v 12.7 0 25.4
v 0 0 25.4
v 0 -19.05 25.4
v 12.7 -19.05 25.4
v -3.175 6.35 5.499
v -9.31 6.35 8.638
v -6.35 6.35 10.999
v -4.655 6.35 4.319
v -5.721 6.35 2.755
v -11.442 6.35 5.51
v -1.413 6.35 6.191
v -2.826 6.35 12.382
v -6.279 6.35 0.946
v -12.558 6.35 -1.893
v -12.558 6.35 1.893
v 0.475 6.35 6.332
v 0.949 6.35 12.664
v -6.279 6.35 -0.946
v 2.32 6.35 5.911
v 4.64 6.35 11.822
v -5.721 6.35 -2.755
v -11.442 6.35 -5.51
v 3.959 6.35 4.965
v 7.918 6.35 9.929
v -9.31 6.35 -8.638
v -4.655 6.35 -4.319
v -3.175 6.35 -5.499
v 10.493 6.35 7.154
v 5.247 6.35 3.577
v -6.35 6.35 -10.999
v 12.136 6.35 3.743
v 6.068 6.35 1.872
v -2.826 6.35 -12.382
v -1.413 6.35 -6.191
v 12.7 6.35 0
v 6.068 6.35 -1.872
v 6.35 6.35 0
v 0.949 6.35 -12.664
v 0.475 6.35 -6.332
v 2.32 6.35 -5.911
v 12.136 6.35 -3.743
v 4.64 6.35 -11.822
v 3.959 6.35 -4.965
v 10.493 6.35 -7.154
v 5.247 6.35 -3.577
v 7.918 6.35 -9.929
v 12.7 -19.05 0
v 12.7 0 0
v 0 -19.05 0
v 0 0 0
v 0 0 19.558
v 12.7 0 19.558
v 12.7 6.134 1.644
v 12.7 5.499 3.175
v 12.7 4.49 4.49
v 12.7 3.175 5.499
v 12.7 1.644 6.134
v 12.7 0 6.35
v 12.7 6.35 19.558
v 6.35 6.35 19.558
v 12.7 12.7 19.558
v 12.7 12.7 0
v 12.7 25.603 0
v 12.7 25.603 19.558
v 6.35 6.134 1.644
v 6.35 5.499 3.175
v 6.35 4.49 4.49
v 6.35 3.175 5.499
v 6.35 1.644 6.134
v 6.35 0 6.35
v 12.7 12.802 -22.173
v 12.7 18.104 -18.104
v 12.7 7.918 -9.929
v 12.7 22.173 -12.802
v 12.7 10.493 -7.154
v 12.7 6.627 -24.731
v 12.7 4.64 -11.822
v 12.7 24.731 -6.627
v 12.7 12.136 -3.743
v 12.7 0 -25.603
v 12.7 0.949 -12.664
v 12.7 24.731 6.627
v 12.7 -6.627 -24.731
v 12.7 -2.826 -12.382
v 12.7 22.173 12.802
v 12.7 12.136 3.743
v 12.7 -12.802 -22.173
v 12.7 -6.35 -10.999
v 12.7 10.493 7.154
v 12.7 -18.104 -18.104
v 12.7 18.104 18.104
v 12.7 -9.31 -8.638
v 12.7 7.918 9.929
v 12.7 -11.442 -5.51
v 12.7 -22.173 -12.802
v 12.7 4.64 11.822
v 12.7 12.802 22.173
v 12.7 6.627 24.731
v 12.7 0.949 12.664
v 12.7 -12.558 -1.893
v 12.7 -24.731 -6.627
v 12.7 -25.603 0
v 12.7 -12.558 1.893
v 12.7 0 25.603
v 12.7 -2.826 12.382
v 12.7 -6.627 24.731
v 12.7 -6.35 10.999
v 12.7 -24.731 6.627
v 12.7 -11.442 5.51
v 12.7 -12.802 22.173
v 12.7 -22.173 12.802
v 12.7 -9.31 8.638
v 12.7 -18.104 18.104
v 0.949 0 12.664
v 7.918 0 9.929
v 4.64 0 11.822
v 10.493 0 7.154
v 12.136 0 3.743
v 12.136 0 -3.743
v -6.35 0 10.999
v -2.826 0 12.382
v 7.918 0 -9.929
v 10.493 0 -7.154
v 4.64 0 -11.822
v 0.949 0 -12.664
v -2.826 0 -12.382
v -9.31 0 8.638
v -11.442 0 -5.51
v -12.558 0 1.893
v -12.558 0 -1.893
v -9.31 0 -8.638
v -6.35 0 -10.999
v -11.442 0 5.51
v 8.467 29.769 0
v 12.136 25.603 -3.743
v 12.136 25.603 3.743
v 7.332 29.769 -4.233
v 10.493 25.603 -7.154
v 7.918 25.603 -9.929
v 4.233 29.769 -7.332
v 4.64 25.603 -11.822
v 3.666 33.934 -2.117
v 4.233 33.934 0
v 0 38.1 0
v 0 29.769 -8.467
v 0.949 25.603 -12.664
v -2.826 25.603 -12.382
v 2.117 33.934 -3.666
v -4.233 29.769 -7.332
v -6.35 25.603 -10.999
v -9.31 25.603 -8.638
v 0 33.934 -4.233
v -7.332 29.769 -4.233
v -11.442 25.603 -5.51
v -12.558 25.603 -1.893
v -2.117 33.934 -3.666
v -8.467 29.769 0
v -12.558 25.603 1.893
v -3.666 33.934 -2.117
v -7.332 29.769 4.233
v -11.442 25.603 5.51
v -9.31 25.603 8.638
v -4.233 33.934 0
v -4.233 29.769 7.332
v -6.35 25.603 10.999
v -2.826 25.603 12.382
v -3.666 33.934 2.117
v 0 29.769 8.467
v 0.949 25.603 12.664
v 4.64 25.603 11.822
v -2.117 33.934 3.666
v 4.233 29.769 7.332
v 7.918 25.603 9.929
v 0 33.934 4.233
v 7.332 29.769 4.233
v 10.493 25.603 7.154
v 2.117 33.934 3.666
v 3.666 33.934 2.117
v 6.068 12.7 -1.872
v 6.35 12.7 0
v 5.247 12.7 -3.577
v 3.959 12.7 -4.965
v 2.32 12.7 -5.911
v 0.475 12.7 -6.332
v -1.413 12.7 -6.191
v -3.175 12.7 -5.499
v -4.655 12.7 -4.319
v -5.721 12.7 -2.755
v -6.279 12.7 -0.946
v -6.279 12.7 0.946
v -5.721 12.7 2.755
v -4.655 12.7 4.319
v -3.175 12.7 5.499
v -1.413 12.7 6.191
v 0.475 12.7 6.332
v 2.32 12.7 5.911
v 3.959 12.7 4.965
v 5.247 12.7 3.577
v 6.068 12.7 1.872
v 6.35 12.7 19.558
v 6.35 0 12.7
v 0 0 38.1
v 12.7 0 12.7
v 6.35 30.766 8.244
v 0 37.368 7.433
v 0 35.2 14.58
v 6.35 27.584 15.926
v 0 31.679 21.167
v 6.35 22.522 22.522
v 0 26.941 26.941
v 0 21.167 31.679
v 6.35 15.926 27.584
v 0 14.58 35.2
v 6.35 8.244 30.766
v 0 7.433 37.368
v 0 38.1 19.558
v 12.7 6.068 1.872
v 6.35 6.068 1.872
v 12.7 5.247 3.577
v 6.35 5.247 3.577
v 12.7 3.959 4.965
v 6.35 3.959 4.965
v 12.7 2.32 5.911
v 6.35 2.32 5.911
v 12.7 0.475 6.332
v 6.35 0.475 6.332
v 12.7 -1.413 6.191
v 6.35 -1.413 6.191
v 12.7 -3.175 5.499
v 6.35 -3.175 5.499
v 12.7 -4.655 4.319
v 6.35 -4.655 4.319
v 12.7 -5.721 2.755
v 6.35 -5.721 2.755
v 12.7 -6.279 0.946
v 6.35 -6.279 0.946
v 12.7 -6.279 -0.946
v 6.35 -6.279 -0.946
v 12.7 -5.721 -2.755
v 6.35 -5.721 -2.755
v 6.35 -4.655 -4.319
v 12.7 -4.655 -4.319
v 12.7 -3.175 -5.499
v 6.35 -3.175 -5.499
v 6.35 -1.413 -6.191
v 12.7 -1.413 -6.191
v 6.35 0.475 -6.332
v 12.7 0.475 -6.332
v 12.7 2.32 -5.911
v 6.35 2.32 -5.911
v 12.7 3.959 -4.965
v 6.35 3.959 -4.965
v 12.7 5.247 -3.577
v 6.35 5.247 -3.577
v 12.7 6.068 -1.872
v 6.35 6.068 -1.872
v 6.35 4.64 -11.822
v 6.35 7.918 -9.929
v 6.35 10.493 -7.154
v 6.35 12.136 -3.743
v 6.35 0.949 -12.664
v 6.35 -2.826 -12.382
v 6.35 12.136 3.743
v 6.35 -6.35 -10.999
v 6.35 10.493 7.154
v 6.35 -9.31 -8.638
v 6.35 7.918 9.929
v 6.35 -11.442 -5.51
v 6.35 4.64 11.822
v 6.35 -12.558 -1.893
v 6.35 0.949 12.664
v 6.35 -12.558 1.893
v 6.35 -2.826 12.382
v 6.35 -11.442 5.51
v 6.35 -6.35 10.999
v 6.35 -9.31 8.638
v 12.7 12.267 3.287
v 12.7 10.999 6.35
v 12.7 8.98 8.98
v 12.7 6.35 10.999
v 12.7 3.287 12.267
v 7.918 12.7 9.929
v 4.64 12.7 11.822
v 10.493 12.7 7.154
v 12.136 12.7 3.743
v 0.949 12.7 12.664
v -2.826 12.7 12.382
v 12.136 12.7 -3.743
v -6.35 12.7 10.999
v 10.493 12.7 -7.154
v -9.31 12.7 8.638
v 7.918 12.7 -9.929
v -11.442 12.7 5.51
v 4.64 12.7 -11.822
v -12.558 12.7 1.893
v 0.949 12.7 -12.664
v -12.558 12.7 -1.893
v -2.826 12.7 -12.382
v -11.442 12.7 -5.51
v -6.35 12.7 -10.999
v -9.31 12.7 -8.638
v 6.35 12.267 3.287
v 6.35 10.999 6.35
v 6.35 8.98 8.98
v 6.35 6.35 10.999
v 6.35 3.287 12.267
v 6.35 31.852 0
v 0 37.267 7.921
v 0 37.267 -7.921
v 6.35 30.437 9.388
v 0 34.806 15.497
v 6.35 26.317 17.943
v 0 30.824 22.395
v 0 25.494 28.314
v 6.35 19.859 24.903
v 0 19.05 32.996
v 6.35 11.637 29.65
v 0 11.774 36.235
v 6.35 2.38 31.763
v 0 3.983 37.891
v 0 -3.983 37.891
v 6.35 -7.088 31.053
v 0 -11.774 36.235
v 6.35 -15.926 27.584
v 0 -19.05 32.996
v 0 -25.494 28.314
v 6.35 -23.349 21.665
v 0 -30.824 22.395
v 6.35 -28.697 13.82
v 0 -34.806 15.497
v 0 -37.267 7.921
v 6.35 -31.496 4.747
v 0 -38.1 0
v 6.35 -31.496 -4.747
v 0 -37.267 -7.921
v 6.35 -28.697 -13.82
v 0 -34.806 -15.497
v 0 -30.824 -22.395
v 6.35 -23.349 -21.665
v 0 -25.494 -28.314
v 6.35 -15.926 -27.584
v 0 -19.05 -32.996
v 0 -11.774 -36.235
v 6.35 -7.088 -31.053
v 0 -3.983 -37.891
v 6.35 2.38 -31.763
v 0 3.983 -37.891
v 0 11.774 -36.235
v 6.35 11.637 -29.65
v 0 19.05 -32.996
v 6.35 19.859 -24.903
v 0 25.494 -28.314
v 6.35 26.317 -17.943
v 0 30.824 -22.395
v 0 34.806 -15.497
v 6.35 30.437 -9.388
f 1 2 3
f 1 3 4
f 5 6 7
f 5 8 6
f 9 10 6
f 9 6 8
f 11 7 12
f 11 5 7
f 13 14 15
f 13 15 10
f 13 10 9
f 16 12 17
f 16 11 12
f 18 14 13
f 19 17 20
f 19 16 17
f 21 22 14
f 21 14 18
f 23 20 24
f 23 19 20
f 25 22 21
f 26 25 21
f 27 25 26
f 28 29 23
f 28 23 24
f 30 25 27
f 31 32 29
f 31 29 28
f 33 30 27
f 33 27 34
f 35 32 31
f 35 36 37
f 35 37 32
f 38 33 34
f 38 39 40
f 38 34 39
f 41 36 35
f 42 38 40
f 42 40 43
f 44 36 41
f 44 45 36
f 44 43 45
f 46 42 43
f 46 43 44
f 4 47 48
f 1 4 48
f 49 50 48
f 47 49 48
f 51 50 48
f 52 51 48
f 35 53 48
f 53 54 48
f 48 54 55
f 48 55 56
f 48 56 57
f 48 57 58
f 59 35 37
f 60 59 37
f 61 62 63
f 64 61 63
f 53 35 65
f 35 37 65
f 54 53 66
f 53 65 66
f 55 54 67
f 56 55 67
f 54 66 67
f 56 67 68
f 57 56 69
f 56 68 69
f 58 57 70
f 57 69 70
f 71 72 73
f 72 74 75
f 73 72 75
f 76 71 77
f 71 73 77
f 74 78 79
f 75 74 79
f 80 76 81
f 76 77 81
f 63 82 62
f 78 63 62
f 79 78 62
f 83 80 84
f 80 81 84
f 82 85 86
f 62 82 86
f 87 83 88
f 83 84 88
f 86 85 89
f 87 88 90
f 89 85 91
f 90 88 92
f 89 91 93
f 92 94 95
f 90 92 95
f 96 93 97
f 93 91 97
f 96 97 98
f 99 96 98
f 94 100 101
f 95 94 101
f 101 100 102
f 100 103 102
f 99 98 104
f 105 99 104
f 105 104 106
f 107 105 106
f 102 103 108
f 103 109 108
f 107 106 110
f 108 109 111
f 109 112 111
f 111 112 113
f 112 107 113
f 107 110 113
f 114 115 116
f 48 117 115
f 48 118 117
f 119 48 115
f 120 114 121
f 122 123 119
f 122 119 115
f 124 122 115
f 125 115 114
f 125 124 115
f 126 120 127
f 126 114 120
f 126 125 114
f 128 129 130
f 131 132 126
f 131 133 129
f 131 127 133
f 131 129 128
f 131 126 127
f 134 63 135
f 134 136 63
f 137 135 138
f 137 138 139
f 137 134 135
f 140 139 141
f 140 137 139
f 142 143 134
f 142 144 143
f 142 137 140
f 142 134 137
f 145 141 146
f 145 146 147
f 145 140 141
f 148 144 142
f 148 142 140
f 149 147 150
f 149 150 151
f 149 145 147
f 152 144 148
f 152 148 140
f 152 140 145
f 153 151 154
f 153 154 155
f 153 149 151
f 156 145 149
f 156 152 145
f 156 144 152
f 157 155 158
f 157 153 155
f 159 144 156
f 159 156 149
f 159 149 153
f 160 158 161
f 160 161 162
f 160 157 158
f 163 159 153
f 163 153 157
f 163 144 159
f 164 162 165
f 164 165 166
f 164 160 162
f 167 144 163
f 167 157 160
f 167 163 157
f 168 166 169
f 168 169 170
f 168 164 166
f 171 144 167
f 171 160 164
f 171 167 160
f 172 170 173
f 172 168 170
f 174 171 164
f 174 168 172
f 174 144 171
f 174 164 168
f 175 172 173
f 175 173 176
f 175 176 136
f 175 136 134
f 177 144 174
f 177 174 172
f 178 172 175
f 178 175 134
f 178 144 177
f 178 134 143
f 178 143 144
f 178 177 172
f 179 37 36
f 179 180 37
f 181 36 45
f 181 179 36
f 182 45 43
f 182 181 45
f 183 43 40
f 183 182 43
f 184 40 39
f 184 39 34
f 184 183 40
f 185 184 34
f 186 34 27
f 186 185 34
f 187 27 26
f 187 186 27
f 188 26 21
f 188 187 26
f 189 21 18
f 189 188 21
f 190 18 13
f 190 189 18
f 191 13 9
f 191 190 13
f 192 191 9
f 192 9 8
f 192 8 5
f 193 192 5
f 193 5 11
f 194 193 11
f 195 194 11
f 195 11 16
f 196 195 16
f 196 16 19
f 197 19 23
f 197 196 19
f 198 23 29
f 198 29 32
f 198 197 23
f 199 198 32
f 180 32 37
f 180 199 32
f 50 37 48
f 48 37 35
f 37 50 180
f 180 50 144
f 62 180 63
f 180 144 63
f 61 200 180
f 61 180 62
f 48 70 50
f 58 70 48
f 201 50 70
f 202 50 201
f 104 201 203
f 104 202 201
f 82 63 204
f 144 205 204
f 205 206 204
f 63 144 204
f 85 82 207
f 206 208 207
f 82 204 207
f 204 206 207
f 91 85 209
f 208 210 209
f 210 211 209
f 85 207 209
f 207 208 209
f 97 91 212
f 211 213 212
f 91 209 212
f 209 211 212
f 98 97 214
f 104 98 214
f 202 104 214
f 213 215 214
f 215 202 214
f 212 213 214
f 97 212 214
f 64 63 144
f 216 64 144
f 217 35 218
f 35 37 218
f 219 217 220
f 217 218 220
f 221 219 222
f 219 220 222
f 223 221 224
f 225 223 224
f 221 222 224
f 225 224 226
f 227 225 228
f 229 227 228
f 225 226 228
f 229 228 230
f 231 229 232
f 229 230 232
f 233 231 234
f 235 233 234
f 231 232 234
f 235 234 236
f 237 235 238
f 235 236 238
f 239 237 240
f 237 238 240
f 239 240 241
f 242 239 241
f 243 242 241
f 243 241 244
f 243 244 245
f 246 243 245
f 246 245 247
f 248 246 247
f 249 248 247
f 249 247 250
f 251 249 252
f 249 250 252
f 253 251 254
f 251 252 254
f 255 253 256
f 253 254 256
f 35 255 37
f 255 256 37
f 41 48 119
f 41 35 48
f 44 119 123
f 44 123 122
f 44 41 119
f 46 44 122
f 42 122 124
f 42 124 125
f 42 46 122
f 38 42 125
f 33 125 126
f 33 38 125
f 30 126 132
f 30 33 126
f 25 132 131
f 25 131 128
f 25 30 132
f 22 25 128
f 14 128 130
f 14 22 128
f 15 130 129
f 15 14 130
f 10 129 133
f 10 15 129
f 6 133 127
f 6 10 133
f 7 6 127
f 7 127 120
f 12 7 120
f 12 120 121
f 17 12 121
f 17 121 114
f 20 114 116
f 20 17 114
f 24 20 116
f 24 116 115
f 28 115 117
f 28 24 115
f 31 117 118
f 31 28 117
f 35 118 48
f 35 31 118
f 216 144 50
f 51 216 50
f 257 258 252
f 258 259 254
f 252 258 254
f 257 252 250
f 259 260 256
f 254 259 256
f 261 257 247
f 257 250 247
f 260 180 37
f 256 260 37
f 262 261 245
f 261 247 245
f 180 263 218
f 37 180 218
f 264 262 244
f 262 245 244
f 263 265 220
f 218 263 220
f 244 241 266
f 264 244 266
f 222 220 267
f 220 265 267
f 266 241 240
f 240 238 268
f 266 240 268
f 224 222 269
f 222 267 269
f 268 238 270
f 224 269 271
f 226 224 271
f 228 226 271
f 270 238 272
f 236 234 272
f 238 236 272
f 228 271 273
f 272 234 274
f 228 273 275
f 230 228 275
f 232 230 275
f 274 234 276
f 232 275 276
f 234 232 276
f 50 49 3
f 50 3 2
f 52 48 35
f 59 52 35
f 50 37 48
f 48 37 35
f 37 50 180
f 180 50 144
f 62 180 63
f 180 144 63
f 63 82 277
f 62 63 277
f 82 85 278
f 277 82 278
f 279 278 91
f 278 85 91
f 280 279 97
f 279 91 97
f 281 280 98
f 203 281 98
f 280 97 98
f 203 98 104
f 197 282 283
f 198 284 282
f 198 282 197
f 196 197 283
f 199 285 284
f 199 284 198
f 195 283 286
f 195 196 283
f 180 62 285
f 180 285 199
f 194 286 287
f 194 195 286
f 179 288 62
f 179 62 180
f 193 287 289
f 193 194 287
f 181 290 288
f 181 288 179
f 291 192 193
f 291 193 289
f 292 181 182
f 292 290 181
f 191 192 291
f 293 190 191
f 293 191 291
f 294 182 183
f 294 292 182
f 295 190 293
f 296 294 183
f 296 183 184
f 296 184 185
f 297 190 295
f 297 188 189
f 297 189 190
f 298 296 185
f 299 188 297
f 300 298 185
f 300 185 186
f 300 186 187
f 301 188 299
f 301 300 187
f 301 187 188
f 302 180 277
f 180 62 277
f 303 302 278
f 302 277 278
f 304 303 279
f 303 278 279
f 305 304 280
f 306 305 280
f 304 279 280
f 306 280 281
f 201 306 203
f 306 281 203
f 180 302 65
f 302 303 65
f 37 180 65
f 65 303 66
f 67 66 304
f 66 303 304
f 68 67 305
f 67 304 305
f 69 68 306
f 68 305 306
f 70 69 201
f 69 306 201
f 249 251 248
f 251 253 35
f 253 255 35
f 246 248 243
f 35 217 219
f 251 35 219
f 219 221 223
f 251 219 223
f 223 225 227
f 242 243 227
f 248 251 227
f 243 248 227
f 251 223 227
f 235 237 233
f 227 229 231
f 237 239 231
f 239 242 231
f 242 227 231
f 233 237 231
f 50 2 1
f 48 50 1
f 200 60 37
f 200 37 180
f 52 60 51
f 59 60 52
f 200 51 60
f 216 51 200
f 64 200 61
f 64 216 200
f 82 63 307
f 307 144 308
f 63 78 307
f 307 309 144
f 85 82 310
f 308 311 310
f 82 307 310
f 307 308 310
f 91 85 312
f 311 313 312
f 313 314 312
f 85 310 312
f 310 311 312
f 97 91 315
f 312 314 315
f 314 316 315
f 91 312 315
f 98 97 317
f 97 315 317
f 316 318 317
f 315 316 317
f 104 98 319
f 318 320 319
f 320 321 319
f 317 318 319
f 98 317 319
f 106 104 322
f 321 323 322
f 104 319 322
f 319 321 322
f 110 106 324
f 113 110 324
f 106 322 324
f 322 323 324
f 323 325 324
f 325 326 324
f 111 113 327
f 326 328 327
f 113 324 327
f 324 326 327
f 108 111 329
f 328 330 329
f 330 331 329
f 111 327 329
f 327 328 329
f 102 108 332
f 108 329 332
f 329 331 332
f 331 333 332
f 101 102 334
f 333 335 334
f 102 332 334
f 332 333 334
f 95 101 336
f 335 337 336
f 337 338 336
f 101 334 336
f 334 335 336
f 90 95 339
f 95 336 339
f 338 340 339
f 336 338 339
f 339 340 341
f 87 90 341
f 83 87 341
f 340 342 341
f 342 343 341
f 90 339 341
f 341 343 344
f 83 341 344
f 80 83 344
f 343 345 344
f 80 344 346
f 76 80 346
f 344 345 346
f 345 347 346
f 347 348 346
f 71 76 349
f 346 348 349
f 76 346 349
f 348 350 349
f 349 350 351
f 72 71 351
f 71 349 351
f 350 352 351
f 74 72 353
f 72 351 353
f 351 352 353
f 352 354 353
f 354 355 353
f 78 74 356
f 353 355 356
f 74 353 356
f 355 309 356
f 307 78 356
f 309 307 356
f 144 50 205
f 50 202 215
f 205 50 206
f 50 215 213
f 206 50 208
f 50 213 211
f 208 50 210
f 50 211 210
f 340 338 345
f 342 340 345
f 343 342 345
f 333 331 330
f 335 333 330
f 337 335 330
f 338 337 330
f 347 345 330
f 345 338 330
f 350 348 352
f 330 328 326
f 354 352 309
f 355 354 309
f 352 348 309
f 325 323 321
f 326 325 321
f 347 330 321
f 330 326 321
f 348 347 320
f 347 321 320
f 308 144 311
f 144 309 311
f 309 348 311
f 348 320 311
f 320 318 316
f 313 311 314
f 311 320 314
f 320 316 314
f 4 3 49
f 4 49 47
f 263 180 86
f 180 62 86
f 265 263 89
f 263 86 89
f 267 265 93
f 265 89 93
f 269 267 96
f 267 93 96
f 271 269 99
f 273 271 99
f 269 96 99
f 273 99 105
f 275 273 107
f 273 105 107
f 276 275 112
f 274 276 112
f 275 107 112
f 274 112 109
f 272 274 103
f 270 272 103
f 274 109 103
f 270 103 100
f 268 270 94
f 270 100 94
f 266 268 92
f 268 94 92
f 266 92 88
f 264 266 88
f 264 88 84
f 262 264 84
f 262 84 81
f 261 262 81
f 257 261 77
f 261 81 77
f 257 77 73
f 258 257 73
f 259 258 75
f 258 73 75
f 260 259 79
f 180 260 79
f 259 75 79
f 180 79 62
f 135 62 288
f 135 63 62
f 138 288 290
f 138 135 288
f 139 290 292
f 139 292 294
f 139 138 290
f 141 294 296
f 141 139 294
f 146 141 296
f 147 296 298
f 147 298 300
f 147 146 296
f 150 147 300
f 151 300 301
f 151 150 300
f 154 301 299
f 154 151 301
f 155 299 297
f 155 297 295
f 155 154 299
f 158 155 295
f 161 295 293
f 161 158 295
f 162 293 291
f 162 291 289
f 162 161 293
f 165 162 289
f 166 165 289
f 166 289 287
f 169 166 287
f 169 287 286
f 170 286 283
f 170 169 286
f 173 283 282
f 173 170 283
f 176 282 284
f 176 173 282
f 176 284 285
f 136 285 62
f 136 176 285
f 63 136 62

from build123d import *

# Parameters (mm, degrees)
F1_DEPTH = 19.558
F4_ANGLE = 90
F5_W     = 12.7
F5_H     = 19.05
F6_DEPTH = 25.4


with BuildPart() as f1:
    # F0 (on Top) → F1 (new body)
    with BuildSketch(Plane.XY):
        Polygon((0, 38.1), (0, 0), (12.7, 0), (12.7, 6.35), (6.35, 6.35), (6.35, 12.7), (12.7, 12.7), (12.7, 25.6031993777), align=None)
    extrude(amount=F1_DEPTH)


with BuildPart() as f2:
    # F0 (on Top) → F2 (revolve)
    with BuildSketch(Plane.XY):
        Polygon((0, 38.1), (0, 0), (12.7, 0), (12.7, 6.35), (6.35, 6.35), (6.35, 12.7), (12.7, 12.7), (12.7, 25.6031993777), align=None)
    revolve(axis=Axis((0, 19.05, 0), (0, 1, 0)))


with BuildPart() as f3:
    # F0 (on Top) → F3 (revolve)
    with BuildSketch(Plane.XY):
        Polygon((0, 38.1), (0, 0), (12.7, 0), (12.7, 6.35), (6.35, 6.35), (6.35, 12.7), (12.7, 12.7), (12.7, 25.6031993777), align=None)
    revolve(axis=Axis((6.35, 0, 0), (1, 0, 0)))


with BuildPart() as f4:
    # F0 (on Top) → F4 (revolve)
    with BuildSketch(Plane.XY):
        Polygon((0, 38.1), (0, 0), (12.7, 0), (12.7, 6.35), (6.35, 6.35), (6.35, 12.7), (12.7, 12.7), (12.7, 25.6031993777), align=None)
    revolve(axis=Axis((6.35, 0, 0), (1, 0, 0)), revolution_arc=F4_ANGLE)


with BuildPart() as f6:
    # F5 (on Top) → F6 (new body)
    with BuildSketch(Plane.XY):
        with Locations((6.35, -9.525)):
            Rectangle(F5_W, F5_H)
    extrude(amount=F6_DEPTH)


solid = Compound([f1.part, f2.part, f3.part, f4.part, f6.part])
